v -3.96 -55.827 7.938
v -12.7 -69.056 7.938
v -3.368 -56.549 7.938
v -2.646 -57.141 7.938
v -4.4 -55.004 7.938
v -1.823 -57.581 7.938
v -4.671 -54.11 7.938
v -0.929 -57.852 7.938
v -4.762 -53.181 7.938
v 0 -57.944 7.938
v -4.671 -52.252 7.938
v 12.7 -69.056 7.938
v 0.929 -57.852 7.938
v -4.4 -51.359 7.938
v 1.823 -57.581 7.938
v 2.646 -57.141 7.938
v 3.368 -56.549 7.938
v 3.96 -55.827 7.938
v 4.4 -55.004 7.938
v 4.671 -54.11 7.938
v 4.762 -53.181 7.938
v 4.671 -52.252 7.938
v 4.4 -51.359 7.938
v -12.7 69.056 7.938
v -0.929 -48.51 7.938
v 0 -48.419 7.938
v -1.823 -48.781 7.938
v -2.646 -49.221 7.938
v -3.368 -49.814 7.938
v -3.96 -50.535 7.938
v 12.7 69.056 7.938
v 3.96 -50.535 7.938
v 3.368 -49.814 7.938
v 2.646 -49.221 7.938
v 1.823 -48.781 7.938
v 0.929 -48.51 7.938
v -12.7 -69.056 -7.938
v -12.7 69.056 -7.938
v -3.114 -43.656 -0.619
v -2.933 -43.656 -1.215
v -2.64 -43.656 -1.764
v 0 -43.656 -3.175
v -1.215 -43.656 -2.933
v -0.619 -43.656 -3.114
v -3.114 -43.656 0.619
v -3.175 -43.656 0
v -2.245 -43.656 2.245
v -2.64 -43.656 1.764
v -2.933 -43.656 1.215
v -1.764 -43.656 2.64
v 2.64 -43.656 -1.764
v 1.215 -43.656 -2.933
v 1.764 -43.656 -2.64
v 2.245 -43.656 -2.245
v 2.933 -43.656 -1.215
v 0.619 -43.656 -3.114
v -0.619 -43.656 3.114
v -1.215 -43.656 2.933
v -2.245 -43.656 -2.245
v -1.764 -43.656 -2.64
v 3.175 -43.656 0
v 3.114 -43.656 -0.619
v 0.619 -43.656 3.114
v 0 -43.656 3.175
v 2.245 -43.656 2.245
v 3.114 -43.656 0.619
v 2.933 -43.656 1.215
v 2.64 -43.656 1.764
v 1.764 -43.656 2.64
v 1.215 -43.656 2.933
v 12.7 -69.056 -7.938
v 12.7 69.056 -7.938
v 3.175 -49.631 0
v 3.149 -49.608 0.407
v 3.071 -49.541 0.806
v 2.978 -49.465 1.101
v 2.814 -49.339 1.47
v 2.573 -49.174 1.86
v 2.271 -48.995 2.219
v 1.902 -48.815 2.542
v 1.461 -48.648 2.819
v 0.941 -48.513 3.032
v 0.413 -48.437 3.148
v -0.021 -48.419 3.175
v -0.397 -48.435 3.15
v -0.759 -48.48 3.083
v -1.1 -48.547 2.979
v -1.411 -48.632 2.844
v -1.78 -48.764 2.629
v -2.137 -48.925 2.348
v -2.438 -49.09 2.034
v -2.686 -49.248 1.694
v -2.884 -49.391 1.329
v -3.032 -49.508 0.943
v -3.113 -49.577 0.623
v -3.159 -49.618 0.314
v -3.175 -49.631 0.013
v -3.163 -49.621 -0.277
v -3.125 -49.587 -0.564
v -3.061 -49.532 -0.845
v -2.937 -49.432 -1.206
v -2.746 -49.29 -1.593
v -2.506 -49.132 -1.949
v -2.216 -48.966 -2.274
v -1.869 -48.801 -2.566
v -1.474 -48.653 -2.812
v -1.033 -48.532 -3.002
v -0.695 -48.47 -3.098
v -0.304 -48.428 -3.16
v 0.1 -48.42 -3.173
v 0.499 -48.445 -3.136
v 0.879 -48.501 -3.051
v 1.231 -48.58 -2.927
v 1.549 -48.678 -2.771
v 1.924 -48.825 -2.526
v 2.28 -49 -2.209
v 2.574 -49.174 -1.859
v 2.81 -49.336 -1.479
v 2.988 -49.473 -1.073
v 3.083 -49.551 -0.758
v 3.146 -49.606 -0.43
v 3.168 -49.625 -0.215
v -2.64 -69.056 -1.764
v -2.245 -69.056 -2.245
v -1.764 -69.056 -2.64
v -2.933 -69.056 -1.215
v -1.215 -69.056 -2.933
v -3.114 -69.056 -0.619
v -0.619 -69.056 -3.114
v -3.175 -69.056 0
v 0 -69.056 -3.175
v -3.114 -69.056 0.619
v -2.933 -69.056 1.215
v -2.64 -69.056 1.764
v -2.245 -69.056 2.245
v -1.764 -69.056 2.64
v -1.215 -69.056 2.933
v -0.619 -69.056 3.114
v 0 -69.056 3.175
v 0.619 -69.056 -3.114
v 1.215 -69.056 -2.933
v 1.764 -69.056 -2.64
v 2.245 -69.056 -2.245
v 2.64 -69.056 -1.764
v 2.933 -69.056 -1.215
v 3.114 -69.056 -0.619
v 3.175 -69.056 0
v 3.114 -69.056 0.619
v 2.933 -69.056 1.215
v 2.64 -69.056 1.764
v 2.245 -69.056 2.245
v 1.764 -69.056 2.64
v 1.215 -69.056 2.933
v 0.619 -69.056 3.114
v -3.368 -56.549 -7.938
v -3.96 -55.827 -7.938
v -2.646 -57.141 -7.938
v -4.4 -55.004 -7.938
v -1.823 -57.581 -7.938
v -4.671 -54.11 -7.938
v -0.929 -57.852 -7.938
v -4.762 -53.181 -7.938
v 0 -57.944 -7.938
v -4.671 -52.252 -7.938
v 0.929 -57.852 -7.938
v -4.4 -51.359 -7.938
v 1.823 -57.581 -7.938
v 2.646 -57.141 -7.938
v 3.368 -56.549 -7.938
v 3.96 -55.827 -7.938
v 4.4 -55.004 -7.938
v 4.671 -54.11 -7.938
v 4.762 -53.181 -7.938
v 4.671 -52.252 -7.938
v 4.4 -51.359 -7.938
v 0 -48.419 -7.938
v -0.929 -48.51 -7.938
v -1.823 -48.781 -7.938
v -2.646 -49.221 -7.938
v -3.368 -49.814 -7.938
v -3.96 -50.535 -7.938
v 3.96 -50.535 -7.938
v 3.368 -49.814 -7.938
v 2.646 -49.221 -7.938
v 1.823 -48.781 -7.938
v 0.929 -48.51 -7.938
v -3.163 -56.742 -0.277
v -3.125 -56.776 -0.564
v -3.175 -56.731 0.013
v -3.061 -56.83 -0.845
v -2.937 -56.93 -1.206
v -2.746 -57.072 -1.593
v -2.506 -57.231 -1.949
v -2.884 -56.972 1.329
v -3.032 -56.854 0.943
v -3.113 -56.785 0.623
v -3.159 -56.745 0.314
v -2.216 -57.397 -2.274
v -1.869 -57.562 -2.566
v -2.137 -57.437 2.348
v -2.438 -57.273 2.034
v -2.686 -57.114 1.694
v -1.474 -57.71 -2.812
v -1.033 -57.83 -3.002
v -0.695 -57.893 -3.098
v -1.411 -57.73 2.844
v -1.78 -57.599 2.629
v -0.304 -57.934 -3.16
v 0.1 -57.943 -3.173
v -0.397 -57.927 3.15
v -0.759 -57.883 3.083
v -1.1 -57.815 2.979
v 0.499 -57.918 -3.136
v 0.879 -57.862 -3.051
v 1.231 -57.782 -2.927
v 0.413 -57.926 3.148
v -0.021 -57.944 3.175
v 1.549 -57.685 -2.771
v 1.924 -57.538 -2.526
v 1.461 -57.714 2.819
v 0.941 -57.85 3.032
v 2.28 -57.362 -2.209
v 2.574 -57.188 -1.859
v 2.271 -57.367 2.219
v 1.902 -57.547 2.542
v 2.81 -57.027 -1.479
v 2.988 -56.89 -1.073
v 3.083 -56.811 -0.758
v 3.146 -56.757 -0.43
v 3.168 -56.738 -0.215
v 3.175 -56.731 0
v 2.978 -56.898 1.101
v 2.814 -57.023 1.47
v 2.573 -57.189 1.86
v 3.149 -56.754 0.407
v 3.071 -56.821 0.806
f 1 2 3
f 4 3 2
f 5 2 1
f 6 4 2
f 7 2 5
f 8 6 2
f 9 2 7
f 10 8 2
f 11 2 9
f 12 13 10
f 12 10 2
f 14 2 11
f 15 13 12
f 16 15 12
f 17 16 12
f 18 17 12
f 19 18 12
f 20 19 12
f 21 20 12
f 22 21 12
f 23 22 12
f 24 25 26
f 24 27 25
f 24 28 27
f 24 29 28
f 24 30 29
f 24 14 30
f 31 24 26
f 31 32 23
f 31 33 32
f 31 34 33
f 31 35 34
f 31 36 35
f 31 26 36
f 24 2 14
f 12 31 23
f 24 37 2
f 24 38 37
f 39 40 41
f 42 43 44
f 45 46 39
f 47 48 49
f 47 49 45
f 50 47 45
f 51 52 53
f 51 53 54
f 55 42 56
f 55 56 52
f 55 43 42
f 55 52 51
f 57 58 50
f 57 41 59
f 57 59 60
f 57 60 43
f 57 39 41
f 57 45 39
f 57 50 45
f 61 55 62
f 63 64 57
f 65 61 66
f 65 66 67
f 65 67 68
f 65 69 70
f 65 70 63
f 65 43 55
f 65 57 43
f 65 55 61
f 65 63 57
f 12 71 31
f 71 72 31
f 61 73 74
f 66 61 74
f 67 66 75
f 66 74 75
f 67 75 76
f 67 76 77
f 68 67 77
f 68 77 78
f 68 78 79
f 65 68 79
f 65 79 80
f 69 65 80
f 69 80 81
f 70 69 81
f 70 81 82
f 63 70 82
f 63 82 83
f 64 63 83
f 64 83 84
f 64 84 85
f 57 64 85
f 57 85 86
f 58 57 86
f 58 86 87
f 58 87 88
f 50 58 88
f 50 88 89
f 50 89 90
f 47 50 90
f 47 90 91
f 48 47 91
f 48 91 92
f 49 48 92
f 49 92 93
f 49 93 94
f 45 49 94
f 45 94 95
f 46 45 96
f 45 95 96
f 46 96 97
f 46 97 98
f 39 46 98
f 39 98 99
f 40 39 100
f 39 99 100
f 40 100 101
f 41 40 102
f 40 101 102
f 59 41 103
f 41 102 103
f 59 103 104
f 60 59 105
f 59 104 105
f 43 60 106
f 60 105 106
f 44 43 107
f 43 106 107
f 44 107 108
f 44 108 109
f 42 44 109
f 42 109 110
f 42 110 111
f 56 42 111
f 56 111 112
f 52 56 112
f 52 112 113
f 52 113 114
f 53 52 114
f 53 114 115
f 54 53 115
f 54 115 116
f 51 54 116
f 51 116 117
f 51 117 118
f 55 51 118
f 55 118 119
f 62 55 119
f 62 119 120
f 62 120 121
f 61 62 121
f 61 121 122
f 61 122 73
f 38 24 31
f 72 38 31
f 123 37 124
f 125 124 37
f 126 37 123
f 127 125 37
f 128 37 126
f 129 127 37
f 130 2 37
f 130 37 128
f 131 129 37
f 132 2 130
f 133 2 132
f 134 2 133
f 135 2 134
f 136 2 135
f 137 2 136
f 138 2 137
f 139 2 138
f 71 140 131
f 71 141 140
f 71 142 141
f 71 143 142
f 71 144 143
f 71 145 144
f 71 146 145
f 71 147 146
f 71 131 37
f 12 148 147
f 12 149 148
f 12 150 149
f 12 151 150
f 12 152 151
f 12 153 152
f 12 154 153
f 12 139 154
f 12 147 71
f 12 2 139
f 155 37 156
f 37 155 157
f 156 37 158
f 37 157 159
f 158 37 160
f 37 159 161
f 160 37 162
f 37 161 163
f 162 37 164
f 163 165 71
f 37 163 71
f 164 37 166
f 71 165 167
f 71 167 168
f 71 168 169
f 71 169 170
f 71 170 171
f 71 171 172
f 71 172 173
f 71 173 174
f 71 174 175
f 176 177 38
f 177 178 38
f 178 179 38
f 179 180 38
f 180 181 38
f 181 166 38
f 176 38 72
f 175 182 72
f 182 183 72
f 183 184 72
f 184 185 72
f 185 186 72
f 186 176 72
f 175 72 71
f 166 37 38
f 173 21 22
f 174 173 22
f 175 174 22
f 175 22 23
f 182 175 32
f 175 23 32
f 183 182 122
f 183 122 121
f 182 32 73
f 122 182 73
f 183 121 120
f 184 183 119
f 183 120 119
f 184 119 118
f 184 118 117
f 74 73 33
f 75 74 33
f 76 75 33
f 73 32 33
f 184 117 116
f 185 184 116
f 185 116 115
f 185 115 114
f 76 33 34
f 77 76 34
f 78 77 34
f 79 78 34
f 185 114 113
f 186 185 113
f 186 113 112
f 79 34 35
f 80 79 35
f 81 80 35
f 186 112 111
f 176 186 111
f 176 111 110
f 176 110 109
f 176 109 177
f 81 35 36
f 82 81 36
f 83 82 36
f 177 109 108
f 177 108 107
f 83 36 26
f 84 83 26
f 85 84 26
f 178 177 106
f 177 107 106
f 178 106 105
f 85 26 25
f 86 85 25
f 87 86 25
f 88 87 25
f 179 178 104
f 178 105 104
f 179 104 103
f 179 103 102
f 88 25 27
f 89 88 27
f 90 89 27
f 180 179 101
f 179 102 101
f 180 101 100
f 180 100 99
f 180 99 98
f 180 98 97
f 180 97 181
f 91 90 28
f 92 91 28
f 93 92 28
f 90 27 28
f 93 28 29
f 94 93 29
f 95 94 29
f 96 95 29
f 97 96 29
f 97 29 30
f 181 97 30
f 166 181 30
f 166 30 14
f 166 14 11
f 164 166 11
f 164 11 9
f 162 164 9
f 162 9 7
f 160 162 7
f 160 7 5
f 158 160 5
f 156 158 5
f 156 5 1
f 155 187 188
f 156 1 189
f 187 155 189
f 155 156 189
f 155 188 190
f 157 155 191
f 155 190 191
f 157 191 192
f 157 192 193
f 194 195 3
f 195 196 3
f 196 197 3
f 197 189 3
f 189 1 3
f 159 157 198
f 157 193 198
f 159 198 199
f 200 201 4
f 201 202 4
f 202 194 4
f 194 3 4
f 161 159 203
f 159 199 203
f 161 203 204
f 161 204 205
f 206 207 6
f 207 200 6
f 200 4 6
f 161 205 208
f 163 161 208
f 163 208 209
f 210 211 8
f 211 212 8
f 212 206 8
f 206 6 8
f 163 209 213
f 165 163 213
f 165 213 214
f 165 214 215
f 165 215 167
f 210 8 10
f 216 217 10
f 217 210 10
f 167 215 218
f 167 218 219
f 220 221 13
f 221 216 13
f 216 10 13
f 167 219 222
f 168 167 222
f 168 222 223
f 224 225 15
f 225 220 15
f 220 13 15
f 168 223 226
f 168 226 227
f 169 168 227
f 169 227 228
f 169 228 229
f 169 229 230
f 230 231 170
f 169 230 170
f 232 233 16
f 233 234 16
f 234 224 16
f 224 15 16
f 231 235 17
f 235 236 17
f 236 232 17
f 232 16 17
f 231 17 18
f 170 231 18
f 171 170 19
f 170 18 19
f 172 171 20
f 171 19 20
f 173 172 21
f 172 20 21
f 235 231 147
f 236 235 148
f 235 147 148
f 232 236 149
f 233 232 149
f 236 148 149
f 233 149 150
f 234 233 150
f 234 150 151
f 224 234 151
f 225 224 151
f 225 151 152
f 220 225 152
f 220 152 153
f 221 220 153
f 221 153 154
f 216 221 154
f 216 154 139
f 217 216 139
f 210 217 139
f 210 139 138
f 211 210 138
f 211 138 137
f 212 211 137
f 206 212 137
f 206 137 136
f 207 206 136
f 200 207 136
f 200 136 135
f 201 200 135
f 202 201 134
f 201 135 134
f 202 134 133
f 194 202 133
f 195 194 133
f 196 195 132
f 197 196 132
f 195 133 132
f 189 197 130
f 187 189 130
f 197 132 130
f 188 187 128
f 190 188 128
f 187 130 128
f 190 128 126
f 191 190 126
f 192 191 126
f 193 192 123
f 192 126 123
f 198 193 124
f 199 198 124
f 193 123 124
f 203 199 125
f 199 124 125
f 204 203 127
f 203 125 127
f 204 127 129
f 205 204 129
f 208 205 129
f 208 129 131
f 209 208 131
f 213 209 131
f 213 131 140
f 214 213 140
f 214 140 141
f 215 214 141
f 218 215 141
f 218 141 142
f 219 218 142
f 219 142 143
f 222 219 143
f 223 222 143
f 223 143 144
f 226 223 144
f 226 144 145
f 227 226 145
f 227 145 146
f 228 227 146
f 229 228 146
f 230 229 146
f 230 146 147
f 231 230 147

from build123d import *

# Parameters (mm, degrees)
F0_W          = 25.4
F0_H          = 15.875
F1_DEPTH      = 69.05625
F1_DEPTH_BACK = 69.05625
F2_R          = 4.7625
F3_DEPTH      = 15.876
F4_R          = 3.175
F5_DEPTH      = 25.4


with BuildPart() as f1:
    # F0 (on Front) → F1 (new body, two sides)
    with BuildSketch(Plane.XZ) as f1_sk:
        Rectangle(F0_W, F0_H)
    extrude(amount=-F1_DEPTH)
    extrude(f1_sk.sketch, amount=F1_DEPTH_BACK)

    # F2 (on face) → F3 (cut, through all)
    with BuildSketch(Plane.XY.offset(7.9375)):
        with Locations((0, -53.18125)):
            Circle(F2_R)
    extrude(amount=-F3_DEPTH, mode=Mode.SUBTRACT)

    # F4 (on face) → F5 (cut)
    with BuildSketch(Plane.XZ.offset(69.05625)):
        Circle(F4_R)
    extrude(amount=-F5_DEPTH, mode=Mode.SUBTRACT)


solid = f1.part
